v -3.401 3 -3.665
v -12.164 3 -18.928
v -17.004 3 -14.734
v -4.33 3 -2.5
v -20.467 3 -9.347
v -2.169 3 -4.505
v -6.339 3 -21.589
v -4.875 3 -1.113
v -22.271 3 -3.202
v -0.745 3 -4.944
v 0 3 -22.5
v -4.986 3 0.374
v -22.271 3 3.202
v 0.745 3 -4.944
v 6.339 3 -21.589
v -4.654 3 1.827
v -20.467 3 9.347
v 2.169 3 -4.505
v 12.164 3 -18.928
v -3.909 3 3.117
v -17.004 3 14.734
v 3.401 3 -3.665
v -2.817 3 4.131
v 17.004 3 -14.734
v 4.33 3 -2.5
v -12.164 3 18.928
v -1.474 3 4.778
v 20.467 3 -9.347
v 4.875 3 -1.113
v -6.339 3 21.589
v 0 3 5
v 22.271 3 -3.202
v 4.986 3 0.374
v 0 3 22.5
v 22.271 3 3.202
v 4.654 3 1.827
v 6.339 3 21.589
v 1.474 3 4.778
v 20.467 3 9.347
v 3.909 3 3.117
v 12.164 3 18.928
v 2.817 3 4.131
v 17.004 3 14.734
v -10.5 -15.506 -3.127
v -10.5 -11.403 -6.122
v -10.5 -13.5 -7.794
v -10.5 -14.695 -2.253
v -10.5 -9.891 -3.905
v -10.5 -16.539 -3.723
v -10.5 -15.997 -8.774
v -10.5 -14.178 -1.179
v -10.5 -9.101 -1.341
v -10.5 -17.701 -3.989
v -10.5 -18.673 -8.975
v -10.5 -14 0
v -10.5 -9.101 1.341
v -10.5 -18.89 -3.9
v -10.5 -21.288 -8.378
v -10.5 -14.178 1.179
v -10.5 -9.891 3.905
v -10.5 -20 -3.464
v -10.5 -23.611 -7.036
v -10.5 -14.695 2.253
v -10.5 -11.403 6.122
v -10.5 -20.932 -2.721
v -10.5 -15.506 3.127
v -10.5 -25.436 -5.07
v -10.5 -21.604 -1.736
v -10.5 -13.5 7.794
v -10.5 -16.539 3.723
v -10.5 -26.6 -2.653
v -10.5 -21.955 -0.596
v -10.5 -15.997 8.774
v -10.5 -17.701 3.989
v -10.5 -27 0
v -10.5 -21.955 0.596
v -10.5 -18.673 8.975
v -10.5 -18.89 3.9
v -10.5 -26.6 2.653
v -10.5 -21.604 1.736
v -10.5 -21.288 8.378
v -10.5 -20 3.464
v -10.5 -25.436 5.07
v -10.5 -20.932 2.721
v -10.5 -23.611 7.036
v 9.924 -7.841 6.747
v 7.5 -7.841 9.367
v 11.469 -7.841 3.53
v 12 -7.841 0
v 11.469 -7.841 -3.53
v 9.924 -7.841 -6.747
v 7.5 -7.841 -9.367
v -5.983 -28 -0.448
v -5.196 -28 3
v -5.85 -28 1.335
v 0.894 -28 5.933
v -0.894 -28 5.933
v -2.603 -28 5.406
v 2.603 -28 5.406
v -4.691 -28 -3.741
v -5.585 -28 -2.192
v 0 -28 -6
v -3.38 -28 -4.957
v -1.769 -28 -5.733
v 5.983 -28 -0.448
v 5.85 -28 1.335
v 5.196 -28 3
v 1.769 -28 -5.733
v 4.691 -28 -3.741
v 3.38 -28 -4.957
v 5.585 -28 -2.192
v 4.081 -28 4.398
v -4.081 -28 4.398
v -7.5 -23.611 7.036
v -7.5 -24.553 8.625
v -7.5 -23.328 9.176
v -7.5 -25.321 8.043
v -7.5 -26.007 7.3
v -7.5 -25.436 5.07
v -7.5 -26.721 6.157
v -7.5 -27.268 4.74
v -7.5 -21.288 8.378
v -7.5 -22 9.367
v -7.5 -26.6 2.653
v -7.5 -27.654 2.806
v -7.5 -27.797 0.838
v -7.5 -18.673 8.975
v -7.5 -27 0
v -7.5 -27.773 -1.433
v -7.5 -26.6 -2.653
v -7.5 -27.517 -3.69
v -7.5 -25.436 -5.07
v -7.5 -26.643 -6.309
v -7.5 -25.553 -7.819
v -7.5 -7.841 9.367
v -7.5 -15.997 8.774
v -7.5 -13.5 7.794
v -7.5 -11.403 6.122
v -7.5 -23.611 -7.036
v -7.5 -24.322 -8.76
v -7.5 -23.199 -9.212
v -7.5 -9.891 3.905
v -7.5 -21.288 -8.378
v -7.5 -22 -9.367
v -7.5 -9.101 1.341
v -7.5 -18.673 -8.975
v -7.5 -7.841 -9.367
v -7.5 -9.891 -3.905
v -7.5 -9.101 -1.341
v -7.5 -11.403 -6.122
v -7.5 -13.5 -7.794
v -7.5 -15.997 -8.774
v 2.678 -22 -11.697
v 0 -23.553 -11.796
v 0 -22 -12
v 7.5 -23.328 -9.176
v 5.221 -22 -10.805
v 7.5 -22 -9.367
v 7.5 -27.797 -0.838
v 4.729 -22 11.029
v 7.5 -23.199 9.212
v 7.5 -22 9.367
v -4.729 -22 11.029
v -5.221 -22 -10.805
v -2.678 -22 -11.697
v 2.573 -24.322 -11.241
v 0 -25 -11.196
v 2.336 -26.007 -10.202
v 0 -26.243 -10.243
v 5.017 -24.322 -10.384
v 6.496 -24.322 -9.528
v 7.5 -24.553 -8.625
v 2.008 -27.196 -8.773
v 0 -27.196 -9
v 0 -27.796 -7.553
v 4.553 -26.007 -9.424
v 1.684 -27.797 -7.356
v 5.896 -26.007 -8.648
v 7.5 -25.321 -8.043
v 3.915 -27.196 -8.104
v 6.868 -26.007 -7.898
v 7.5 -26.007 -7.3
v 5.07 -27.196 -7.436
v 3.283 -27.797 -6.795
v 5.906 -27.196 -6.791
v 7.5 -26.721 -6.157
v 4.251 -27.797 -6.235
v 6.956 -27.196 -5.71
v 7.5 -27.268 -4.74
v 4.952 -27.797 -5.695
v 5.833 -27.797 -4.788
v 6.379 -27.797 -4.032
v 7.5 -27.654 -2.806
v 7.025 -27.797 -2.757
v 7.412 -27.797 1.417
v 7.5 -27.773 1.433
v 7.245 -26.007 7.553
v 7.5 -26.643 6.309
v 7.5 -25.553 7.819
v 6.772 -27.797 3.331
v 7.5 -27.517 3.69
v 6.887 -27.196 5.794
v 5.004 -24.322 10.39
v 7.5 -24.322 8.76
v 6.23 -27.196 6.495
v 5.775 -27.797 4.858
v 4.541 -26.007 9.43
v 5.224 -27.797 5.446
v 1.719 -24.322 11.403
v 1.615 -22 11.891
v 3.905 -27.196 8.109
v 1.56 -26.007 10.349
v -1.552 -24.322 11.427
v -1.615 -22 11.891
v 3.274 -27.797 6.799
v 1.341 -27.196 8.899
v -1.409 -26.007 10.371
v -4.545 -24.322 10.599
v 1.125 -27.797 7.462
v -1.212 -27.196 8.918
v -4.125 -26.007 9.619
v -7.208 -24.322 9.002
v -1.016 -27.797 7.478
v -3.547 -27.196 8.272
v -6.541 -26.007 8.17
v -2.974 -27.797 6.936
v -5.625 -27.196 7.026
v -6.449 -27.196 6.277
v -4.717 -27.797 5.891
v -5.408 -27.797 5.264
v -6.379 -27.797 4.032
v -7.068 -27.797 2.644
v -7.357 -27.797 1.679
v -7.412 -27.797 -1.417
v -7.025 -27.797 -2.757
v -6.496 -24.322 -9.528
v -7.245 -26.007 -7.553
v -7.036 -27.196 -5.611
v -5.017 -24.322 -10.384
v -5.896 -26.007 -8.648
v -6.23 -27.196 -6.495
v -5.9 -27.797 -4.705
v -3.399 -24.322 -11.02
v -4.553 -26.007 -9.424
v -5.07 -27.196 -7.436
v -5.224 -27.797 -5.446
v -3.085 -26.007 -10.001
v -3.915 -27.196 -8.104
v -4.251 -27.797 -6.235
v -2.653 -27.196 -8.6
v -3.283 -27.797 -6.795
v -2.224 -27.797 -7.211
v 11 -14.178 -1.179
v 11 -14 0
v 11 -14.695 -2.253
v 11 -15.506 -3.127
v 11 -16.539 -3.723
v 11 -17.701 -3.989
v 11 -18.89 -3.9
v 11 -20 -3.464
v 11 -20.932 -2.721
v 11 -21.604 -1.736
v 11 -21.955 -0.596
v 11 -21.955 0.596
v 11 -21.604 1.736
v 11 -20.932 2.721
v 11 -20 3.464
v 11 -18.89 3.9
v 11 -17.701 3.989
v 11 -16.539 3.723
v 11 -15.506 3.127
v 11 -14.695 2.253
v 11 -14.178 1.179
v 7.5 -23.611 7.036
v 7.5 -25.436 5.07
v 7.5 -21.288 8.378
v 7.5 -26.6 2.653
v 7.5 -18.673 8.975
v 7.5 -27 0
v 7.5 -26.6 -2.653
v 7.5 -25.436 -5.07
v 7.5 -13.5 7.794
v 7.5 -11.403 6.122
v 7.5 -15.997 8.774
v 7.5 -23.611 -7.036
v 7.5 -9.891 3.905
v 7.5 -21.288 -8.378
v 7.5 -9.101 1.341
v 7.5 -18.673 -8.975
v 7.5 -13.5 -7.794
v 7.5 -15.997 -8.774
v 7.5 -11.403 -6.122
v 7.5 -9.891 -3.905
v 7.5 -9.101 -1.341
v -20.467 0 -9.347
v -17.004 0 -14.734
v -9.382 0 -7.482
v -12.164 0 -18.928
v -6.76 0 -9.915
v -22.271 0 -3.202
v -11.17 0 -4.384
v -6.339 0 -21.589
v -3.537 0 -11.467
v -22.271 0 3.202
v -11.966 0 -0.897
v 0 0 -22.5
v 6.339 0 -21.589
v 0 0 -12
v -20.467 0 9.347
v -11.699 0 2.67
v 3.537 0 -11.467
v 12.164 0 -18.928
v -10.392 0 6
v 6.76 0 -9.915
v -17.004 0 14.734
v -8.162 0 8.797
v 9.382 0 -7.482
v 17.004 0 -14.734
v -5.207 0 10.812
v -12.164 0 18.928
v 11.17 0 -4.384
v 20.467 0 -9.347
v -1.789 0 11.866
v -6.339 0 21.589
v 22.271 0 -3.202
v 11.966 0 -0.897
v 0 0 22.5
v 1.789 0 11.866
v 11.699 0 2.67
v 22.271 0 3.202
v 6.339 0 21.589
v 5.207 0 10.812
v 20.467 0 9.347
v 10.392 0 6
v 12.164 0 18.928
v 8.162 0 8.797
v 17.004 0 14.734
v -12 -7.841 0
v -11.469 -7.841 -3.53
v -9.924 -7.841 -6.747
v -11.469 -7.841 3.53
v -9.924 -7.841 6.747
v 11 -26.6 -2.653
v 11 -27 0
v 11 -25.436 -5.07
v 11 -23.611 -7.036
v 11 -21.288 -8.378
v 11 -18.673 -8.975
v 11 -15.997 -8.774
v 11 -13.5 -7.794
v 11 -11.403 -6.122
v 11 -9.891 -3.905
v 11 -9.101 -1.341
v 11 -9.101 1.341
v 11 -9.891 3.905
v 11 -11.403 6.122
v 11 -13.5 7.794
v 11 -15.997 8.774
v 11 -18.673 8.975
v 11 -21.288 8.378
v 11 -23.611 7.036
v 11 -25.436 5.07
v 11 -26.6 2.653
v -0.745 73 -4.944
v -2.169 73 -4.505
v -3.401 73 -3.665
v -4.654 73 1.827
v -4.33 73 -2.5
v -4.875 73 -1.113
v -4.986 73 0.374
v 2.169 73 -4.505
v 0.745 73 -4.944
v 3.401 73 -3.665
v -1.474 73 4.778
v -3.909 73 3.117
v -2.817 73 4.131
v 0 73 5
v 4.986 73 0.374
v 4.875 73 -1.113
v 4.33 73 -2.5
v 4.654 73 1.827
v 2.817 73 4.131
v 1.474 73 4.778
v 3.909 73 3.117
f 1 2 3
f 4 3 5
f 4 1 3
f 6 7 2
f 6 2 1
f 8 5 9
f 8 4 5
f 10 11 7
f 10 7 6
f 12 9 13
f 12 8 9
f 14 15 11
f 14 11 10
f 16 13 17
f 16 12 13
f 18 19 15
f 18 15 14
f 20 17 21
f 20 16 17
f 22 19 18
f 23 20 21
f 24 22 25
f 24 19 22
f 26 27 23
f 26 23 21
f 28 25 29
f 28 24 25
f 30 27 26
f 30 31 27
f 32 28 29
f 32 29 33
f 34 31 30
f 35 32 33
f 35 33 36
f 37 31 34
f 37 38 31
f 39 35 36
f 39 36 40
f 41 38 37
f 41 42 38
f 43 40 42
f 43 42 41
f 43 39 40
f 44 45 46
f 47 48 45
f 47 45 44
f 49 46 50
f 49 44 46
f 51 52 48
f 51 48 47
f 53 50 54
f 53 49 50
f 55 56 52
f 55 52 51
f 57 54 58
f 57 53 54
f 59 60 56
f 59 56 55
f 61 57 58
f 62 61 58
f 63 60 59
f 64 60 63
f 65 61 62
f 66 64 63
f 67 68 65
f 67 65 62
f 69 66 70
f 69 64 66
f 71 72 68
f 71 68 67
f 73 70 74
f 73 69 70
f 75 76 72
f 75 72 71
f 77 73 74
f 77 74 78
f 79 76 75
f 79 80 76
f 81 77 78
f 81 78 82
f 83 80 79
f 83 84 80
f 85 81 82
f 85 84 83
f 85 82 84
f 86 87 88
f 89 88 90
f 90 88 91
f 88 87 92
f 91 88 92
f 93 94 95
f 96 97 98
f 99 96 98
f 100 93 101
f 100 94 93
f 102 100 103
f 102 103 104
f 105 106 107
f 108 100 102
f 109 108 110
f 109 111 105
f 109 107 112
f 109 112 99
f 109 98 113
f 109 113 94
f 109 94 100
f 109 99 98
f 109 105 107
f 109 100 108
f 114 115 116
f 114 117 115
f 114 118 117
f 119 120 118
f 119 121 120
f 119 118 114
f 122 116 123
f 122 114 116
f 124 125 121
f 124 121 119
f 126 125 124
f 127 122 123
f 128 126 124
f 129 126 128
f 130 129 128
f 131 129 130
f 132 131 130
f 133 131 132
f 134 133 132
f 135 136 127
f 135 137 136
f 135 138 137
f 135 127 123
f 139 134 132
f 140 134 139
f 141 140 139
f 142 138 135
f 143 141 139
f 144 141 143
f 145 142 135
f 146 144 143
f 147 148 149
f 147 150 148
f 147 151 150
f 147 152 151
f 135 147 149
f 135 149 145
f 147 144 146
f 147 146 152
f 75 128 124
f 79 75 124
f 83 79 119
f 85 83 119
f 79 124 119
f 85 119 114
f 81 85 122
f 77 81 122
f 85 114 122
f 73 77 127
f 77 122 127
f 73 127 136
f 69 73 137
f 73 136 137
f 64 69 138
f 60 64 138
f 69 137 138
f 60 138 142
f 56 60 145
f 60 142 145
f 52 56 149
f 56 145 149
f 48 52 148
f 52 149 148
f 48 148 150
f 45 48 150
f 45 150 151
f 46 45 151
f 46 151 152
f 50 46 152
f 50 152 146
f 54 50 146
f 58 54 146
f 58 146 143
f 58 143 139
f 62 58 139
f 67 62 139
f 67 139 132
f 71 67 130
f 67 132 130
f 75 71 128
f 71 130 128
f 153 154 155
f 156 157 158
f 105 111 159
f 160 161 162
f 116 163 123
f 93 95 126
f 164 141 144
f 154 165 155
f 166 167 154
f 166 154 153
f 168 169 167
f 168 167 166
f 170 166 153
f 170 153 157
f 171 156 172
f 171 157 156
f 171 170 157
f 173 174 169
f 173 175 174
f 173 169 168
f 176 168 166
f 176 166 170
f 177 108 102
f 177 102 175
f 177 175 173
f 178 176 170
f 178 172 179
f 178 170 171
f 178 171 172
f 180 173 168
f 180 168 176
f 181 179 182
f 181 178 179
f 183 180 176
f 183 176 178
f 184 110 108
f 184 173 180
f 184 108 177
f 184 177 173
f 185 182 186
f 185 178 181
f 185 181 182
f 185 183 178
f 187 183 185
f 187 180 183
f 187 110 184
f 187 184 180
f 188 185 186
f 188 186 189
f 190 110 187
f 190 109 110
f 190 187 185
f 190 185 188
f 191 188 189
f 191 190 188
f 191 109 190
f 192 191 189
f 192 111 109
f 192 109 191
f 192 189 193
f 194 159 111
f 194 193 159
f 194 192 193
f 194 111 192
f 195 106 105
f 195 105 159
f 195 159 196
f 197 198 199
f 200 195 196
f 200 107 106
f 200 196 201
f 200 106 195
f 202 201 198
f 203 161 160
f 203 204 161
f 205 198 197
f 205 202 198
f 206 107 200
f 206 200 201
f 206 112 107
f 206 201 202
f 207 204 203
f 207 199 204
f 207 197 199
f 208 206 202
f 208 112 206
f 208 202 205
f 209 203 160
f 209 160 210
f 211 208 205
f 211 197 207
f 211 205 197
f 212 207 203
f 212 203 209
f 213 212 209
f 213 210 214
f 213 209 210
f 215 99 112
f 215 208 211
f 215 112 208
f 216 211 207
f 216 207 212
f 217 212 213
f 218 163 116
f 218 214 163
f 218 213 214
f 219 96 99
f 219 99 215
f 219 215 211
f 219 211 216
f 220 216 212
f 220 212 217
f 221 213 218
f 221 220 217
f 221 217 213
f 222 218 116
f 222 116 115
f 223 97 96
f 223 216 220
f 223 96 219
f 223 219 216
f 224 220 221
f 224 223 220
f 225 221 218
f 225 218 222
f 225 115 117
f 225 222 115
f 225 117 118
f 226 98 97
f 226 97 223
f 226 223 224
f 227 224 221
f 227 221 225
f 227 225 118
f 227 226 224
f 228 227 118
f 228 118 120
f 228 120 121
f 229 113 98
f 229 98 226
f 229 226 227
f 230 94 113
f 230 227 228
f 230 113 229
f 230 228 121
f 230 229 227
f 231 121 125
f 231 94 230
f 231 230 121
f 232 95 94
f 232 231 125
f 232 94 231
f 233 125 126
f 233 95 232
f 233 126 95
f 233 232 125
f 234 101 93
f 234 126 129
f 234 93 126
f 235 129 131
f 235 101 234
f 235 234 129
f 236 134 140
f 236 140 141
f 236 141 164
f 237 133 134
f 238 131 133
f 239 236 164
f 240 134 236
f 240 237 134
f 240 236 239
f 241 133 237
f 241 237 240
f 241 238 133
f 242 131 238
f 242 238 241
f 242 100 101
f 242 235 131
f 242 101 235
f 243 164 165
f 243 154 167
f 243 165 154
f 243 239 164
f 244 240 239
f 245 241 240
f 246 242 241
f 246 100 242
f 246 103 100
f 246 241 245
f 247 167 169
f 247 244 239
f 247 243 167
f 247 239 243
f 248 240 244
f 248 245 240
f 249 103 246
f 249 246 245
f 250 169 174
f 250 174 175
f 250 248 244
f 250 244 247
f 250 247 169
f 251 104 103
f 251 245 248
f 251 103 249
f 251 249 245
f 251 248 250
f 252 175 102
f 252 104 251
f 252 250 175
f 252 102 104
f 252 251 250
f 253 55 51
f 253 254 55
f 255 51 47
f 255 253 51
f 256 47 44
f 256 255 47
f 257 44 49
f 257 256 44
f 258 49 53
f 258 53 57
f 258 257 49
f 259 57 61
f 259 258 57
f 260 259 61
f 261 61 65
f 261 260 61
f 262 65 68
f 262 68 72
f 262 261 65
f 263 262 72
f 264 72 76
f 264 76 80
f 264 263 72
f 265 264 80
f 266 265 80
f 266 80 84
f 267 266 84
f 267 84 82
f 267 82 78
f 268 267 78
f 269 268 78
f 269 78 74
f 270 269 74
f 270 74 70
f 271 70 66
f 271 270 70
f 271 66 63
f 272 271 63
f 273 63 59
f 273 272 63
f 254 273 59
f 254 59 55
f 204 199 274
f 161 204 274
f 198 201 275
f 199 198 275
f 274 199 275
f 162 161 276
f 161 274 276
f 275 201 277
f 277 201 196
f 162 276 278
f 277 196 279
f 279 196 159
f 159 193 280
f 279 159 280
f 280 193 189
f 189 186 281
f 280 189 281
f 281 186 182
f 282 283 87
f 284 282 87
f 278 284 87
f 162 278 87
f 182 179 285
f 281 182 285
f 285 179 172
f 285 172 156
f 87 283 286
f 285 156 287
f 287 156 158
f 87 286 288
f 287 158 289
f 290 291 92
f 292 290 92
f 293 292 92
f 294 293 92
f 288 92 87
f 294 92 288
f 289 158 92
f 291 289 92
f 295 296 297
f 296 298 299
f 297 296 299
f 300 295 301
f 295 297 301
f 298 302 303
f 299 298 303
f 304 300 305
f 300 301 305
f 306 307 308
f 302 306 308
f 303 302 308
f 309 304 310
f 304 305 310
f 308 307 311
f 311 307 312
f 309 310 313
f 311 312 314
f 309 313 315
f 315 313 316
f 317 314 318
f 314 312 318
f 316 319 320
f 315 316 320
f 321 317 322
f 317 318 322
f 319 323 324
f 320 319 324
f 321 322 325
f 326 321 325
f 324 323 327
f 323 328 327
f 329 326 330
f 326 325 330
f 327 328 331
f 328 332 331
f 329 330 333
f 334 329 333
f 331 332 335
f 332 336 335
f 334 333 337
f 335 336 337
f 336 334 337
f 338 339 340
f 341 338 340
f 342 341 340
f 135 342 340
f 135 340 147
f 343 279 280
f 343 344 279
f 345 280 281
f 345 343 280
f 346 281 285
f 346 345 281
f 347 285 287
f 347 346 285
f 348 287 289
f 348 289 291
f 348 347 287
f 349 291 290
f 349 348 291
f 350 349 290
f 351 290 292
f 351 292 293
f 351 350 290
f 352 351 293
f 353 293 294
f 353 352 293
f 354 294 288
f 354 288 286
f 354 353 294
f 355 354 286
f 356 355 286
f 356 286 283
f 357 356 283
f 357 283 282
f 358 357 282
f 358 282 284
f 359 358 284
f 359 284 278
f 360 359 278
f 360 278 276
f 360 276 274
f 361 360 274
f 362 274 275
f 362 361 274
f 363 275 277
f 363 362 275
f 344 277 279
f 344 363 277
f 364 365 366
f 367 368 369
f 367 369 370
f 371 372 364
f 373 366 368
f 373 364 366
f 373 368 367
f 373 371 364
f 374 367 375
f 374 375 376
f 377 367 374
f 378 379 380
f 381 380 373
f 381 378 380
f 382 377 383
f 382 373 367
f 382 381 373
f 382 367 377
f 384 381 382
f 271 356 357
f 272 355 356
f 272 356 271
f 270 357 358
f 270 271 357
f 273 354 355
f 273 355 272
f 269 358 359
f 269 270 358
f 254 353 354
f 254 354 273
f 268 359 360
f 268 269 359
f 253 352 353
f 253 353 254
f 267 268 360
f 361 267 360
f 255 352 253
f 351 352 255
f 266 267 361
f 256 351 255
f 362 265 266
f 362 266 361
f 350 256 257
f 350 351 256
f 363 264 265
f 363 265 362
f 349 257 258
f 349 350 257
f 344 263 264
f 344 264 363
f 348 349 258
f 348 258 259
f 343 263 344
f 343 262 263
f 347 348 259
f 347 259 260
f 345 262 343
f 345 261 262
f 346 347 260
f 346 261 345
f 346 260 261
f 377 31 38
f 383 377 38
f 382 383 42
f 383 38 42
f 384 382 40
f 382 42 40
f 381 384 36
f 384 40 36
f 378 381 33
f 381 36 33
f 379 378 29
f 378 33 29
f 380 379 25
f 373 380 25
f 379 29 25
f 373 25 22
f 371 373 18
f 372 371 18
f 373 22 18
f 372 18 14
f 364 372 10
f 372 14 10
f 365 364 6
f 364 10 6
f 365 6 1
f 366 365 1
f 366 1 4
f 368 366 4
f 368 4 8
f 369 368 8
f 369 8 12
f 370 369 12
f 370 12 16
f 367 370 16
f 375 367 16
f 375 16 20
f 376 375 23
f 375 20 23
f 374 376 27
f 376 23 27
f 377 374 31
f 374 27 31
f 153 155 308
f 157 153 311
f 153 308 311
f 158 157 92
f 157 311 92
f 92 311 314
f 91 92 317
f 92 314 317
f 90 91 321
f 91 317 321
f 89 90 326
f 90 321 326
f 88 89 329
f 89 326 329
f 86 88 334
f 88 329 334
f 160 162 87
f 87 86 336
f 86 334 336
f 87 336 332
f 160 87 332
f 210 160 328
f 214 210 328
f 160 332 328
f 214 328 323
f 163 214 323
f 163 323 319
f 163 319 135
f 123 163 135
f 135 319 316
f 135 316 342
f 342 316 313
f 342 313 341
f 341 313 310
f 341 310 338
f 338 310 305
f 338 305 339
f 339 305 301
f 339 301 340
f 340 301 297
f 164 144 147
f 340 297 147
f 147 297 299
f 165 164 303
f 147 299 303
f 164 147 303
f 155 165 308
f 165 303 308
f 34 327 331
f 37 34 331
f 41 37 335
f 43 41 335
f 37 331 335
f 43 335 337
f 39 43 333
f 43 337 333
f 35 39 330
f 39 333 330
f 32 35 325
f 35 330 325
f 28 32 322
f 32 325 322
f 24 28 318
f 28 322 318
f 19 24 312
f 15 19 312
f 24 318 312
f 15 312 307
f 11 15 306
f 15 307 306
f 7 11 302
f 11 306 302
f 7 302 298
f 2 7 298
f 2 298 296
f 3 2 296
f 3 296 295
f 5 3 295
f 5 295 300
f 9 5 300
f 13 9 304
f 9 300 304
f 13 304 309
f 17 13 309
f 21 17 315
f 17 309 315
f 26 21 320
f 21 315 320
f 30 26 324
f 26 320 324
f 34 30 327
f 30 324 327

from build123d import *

# Parameters (mm, degrees)
SKETCH1_R               = 22.5
BOSS_EXTRUDE1_DEPTH     = 3
SKETCH2_R               = 5
BOSS_EXTRUDE2_DEPTH     = 70
SKETCH3_R               = 12
BOSS_EXTRUDE3_DEPTH     = 28
FILLET1_R               = 6
CUT_EXTRUDE1_DEPTH      = 80.633535649
CUT_EXTRUDE1_DEPTH_BACK = 80.633535649
SKETCH4_W               = 15.997747603
SKETCH4_H               = 20
SKETCH5_R               = 4
CUT_EXTRUDE2_DEPTH      = 83.068568892
SKETCH6_R               = 9
SKETCH6_R_2             = 4
BOSS_EXTRUDE15_DEPTH    = 3.5
SKETCH10_R              = 9
SKETCH10_R_2            = 4
BOSS_EXTRUDE19_DEPTH    = 3


with BuildPart() as part:
    # Sketch1 → Boss-Extrude1 (new body)
    with BuildSketch(Plane(origin=(0, 0, 0), x_dir=(1, 0, 0), z_dir=(0, 1, 0))):
        with Locations(Location((0, 0, 0), (0, 0, 270))):
            Circle(SKETCH1_R)
    extrude(amount=BOSS_EXTRUDE1_DEPTH)

    # Sketch2 → Boss-Extrude2 (add)
    with BuildSketch(Plane(origin=(0, 3, 0), x_dir=(1, 0, 0), z_dir=(0, 1, 0))):
        with Locations(Location((0, 0, 0), (0, 0, 270))):
            Circle(SKETCH2_R)
    extrude(amount=BOSS_EXTRUDE2_DEPTH)

    # Sketch3 → Boss-Extrude3 (add)
    with BuildSketch(Plane.XZ):
        with Locations(Location((0, 0, 0), (0, 0, 270))):
            Circle(SKETCH3_R)
    extrude(amount=BOSS_EXTRUDE3_DEPTH)

    # Fillet1
    fillet1_edges = [part.edges().sort_by_distance(p)[0] for p in [
        (0, -28, 12),
    ]]
    fillet(fillet1_edges, radius=FILLET1_R)

    # Sketch4 → Cut-Extrude1 (cut, two sides: drawn at the far end of the back side and taken through both)
    with BuildSketch(Plane.XY.offset(-CUT_EXTRUDE1_DEPTH_BACK)):
        with Locations((-15.498873802, -17.840930737)):
            Rectangle(SKETCH4_W, SKETCH4_H)
        with Locations((15.498873802, -17.840930737)):
            Rectangle(SKETCH4_W, SKETCH4_H)
    extrude(amount=CUT_EXTRUDE1_DEPTH + CUT_EXTRUDE1_DEPTH_BACK, mode=Mode.SUBTRACT)

    # Sketch5 → Cut-Extrude2 (cut, through all)
    with BuildSketch(Plane(origin=(7.5, 0, 0), x_dir=(0, 0, -1), z_dir=(1, 0, 0))):
        with Locations(Location((0, -18, 0), (0, 0, 90))):
            Circle(SKETCH5_R)
    extrude(amount=-CUT_EXTRUDE2_DEPTH, mode=Mode.SUBTRACT)

    # Sketch6 → Boss-Extrude15 (add, symmetric)
    with BuildSketch(Plane(origin=(7.5, 0, 0), x_dir=(0, 0, -1), z_dir=(1, 0, 0))):
        with Locations(Location((0, -18, 0), (0, 0, 270))):
            Circle(SKETCH6_R)
        with Locations(Location((0, -18, 0), (0, 0, 90))):
            Circle(SKETCH6_R_2, mode=Mode.SUBTRACT)
    extrude(amount=BOSS_EXTRUDE15_DEPTH, both=True)

    # Sketch10 → Boss-Extrude19 (add)
    with BuildSketch(Plane.ZY.offset(7.5)):
        with Locations(Location((0, -18, 0), (0, 0, 270))):
            Circle(SKETCH10_R)
        with Locations(Location((0, -18, 0), (0, 0, 90))):
            Circle(SKETCH10_R_2, mode=Mode.SUBTRACT)
    extrude(amount=BOSS_EXTRUDE19_DEPTH)


solid = part.part
